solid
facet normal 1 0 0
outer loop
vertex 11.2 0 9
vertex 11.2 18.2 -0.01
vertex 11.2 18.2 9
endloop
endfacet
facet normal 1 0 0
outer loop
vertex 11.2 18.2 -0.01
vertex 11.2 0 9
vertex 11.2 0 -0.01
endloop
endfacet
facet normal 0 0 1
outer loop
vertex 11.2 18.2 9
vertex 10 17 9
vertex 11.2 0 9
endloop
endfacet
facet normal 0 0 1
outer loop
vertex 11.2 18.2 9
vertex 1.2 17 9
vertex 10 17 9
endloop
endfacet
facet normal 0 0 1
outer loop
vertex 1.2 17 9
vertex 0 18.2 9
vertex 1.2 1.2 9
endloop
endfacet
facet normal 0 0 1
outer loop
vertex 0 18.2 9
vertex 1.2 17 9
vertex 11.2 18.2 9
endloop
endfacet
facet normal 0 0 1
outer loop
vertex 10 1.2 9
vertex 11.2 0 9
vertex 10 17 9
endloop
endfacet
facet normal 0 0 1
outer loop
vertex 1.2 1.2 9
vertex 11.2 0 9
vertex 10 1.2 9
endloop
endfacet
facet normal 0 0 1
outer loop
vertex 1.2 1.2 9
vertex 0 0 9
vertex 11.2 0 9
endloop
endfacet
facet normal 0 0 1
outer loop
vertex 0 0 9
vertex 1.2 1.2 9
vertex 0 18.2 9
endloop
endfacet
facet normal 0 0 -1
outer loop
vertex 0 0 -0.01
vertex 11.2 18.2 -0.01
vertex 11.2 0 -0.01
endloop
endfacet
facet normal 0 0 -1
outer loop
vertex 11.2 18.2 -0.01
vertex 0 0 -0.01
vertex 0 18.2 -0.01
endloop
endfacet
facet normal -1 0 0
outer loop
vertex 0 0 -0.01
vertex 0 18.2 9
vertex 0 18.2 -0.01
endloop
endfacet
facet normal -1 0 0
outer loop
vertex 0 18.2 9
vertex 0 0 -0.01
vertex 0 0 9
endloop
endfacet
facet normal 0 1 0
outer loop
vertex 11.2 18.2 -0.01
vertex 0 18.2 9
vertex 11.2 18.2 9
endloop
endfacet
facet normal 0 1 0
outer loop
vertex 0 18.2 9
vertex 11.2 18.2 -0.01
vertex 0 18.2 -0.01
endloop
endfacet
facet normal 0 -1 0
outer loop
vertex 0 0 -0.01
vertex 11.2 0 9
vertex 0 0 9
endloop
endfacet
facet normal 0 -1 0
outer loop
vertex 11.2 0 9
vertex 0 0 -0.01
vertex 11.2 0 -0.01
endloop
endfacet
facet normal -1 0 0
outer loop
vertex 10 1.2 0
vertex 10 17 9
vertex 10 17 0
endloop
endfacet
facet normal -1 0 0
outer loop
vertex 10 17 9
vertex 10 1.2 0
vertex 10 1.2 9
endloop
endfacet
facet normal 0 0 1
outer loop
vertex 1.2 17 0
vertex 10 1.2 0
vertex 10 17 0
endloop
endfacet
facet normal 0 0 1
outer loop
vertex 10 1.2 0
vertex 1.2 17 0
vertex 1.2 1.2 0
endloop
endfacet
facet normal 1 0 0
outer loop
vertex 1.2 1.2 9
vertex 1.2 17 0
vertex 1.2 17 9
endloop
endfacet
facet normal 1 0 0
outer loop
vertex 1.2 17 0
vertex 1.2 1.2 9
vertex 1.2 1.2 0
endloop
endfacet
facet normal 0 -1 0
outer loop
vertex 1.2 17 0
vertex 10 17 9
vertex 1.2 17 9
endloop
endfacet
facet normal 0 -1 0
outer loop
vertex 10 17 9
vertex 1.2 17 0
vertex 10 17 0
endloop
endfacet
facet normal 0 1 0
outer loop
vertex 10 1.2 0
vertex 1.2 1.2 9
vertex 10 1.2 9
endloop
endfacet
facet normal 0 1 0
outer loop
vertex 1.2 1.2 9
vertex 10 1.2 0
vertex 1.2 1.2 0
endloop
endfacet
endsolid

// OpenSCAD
// file: ../Base/Rotation.scad
// Fischertechnik Box Foundation
// Geometry Helpers Rotation

include <PlacementOptions.scad>

// getRotatedSpace(space, rotation=NoRotation)
// Rotates the space dependent on the specified rotation

function getRotatedSpace(space, rotation=NoRotation) = [
    (rotation == Rotate90 || rotation == Rotate270) ? space.y : space.x,
    (rotation == Rotate90 || rotation == Rotate270) ? space.x : space.y
];

// Rotates the given space around the fixed left lower corner
// space = the space the children needs as width/depth list [width,depth]
// rotation = 0 Rotate0 degrees, 1 Rotate90 degrees, 2 Rotate180 degrees, 3 Rotate270 degrees (equivalent to -90)

module RotateFix(space, rotation=NoRotation) {
    dy = (rotation == Rotate0 || rotation == Rotate270) ? 0 :
        (rotation == Rotate90) ? space.x :
        space.y;
    dx = (rotation < Rotate180) ? 0 :
        (rotation == Rotate180) ? space.x :
        space.y;
    
    translate([dx, dy, 0])
        rotate([0, 0, rotations[rotation]])
            children();
}
// file: ../Base/Alignment.scad
// Fischertechnik Box Foundation
// Geometry Helpers Alignment

include <PlacementOptions.scad>

// getAlignedX(elementWidth, spaceWidth, align=AlignRight, offset=0)
// Gets the aligned X offset of an element with the given
// width in the given space.
// elementWidth = The width of the element to positon
// spaceWidth = The space where the element should be aligned
// align = 0 AlignLeft, 1 AlignCenter, 2 AlignRight
// offset = an optional offset from the aligned position. When
// aligned left or centered, then positive values are in X direction.
// When aligned right then positive values are in negative X direction.

function getAlignedX(elementWidth, spaceWidth, align=AlignRight, offset=0) =
    (align == AlignLeft) ?
        offset :
        ((align == AlignCenter) ?
        (spaceWidth - elementWidth)/2 + offset :
        spaceWidth - offset - elementWidth);

// getAlignedY(elementDepth, spaceDepth, align=AlignTop, offset=0)
// Gets the aligned Y offset of an element with the given
// depth in the given space.
// elementDepth = The depth of the element to positon
// spaceDepth = The space where the element should be aligned
// align = 0 AlignBottom, 1 AlignCenter, 2 AlignTop
// offset = an optional offset from the aligned position. When
// aligned bottom or centered, then positive values are in Y direction.
// When aligned top then positive values are in negative Y direction.

function getAlignedY(elementDepth, spaceDepth, align=AlignTop, offset=0) =
    (align == AlignBottom) ?
        offset :
        ((align == AlignCenter) ?
        (spaceDepth - elementDepth)/2 + offset :
        spaceDepth - offset - elementDepth);
// file: ../Base/PlacementOptions.scad
// Fischertechnik Box Foundation
// Placement Options

// Alignment
NoAlign = 0;
AlignLeft = 1;
AlignBottom = 2;
AlignCenter = 3;
AlignRight = 4;
AlignTop = 5;

// Element rotation degree steps
rotations = [0, -90, -180, -270];

// Rotation
NoRotation = 0;
Rotate0 = 0;
Rotate90 = 1;
Rotate180 = 2;
Rotate270 = 3;

// Docking (seen from above)
NoDock = -1;
DockLeft = 0;
DockTop = 1;
DockRight = 2;
DockCorner = 2;
DockBottom = 3;

// Web corners
LowerLeft = 0;
UpperLeft = 1;
UpperRight = 2;
LowerRight = 3;

// Web position relative to corner
LeftOfCorner = 0;
RightOfCorner = 1;

// Rails direction
Horizontal = true;
Vertical = false;
// file: ../Base/Boxes.scad
// Fischertechnik Box Foundation
// Pre-designed Boxes

use <Constants.scad>

include <PlacementOptions.scad>

box190Width = 190;
box190Depth = 130;
box130Width = 130;
box130Depth = 95;

// Values are from an original ec3 box
topBottomDifference = 1.5;
outerHeight = 40;
baseThickness = 1.8;
innerHeight = outerHeight - baseThickness;
stackExcess = 5.7;
radius = 3.5;
wallThickness = 1.5;
tolerance = 0.2;

boxWallThickness = wallThickness;
boxBaseThickness = baseThickness;
boxWebWidth = 3.0;

// getBoxWallThickness()
// Gets the wall thickness of a Fischertechnik Box
function getBoxWallThickness() = boxWallThickness;

// getBoxUsageHeight(height = 38.2)
// Gets the usable height of a Fischertechnik box
// height = Outer height of the box from the bottom to the upper edge.
function getBoxUsageHeight(height = outerHeight) = height - baseThickness - stackExcess;

// getBoxInnerHeight()
// Gets the inner height of a Fischertechnik box, including the stack excess
function getBoxInnerHeight() = innerHeight;

// getBoxBaseThickness()
// Gets the thickness of the Fischertechnik box base.
function getBoxBaseThickness() = boxBaseThickness;

// getBoxWebWidth()
// Gets the width of a box web
function getBoxWebWidth() = boxWebWidth;

// getBox190Space()
// Gets the usable inner space of a Box 190 as an x/y-list
function getBox190Space() = [
    box190Width - 2*getBoxWallThickness() - topBottomDifference, 
    box190Depth - 2*getBoxWallThickness() - topBottomDifference ];

// RoundedCornerPlate(width, depth, height, radius)
// Creates a body plate with rounded corners for a box. Used
// also to create the complete box with the hull module.
// width = Width of the plate
// depth = depth of the plate 
// height = thickness of the plate
// radius = radius of the rounded corner
module RoundedCornerPlate(width, depth, height, radius) {
    translate([radius, radius])
    hull() {
        w = width-2*radius;
        d = depth-2*radius;
        cube([w, d, height]);
        cylinder(height, r=radius, $fn=getFragments());
        translate([w, 0])
            cylinder(height, r=radius, $fn=getFragments());
        translate([w, d])
            cylinder(height, r=radius, $fn=getFragments());
        translate([0, d])
            cylinder(height, r=radius, $fn=getFragments());
    }
}

// BoxBase(width, depth)
// Creates an empty stackable Fischertechnik compatible box
// width = Outer width of the box (190, 130, ...)
// depth = Outer depth of the box (130, 95, ...)

module BoxBase(width, depth, height=outerHeight) {    
    thinPlate = 0.01;

    innerHeight = height - baseThickness;    
    
    module Body(tolerance=tolerance) {
        hull() {
            // Bottom with tolerance to fit into the original boxes when stacked
            translate([-wallThickness+tolerance, -wallThickness+tolerance, -baseThickness])
                RoundedCornerPlate(width-topBottomDifference-2*tolerance, depth-topBottomDifference-2*tolerance, thinPlate, radius);
            
            // Top
            translate([-wallThickness-topBottomDifference/2, -wallThickness-topBottomDifference/2, innerHeight-thinPlate])
                RoundedCornerPlate(width, depth, thinPlate, radius);
         }
    }

    module Cutoff() {
        hull() {
            coWidth = width - 2*wallThickness;
            coDepth = depth - 2*wallThickness;
            
            // Bottom
            RoundedCornerPlate(coWidth-topBottomDifference, coDepth-topBottomDifference, thinPlate, radius);

            // Top
            translate([-topBottomDifference/2, -topBottomDifference/2, innerHeight+thinPlate]) 
                RoundedCornerPlate(coWidth, coDepth, thinPlate, radius);
        }
    }
    
    difference() {        
        Body();
        Cutoff();
        stackOffset = innerHeight - stackExcess;
        translate([0, 0, stackOffset + baseThickness])
            Body(tolerance=0);
    }
}

// Creates the Fischertechnik empty box 130x190 mm and places it at position 0,0
// 190x130 are the outer sizes, the inner space is slightly smaller. Use getBox190Space() to get the inner sizes.
// The box is positioned that the usable inner space is at the 0,0,0 position.

module Box190() {
    BoxBase(box190Width, box190Depth);
}

// Gets the usable inner space of a Box 130 as an x/y-list
function getBox130Space() = [
    box130Width - 2*getBoxWallThickness() - topBottomDifference, 
    box130Depth - 2*getBoxWallThickness() - topBottomDifference ];

// Creates the Fischertechnik empty box 95x130 mm and places it at position 0,0
// 190x130 are the outer sizes, the inner space is slightly smaller. Use getBox190Space() to get the inner sizes.
// The box is positioned that the usable inner space is at the 0,0,0 position.

module Box130() {
    BoxBase(box130Width, box130Depth);
}

// Creates a web at the specified box walls
// corner 0 = LowerLeft, 1 = UpperLeft, 2 = UpperRight, 3 = LowerRight
// side 0 = LeftOfCorner, 1 = RightOfCorner
// distance = Distance in mm from the corner
// boxSpace = inner width and depth of the box (default: Box 190)
// webWidth = length of the web (default is 3 mms)
// webThickness = thickness of the web (default is 1 mm)
// height = Height of the web (standard is getBoxUsageHeight())
// sink = How much of the web is sunk into the wall

module BoxWeb(
    corner, 
    side, 
    distance, 
    boxSpace=getBox190Space(), 
    webWidth=getBoxWebWidth(), 
    webThickness=1.0, 
    height=getBoxUsageHeight(),
    sink = getBoxWallThickness()/2) {
    width = (corner % 2 == 0) ? 
            (side == LeftOfCorner ? webWidth : webThickness) :
            (side == LeftOfCorner ? webThickness : webWidth);

    depth = (corner % 2 == 0) ? 
            (side == RightOfCorner ? webWidth : webThickness) :
            (side == RightOfCorner ? webThickness : webWidth);
    
    xDiff = corner == LowerLeft ? 
                (side == LeftOfCorner ? -sink : distance) :
            (corner == UpperLeft ?                
                (side == LeftOfCorner ? distance : -sink) :
            (corner == UpperRight ?
                (side == LeftOfCorner ? boxSpace.x-webWidth+sink : boxSpace.x-distance-webThickness) :
                (side == LeftOfCorner ? boxSpace.x-distance-webThickness: boxSpace.x-webWidth+sink)));

    yDiff = corner == LowerLeft ? 
                (side == RightOfCorner ? -sink : distance) :
            (corner == UpperLeft ?
                (side == RightOfCorner ? boxSpace.y-distance-webThickness : boxSpace.y-webWidth+sink) :
            (corner == UpperRight ?
                (side == RightOfCorner ? boxSpace.y-webWidth+sink : boxSpace.y-distance-webThickness) :
                (side == RightOfCorner ? distance : -sink)));
    
    translate([xDiff, yDiff, -getExcess()])
        cube([width, depth, height + 2*getExcess()]);
}
// file: ../Base/Placement.scad
// Fischertechnik Box Foundation
// Geometry Helpers Placement

use <Constants.scad>
use <Alignment.scad>
use <Rotation.scad>
use <Boxes.scad>

include <PlacementOptions.scad>

// Place(x=0, y=0, elementSpace=[0,0], alignX=AlignLeft, alignY=AlignBottom, rotation=Rotate0, boxSpace=getBox190Space())
// Places the child at the specified position
// y = Y-Position. This is a relative position when an X aligment is specified.
// x = X-Position. This is a relative position when an Y aligment is specified.
// elementSpace = space of the element to be placed [x,y]
// alignX = -1=NoAlign, 0 AlignLeft, 1 AlignCenter, 3 AlignRight (elementSpace and boxSpace required!)
// alignY = -1=NoAlign, 2 AlignBottom, 1 AlignCenter, 4 AlignTop (elementSpace and boxSpace required!)
// rotation = 0 Rotate0 0 degrees, 1 Rotate90 90 degrees, 
// 2 Rotate180 180 degrees, 3 Rotate270 270 degrees (equivalent to -90)
// boxSpace = Inner space of the box where the placement occurs [x,y] - default is Box 190x130 inner space

module Place(x=0, y=0, elementSpace=[0,0], 
  alignX=AlignLeft, alignY=AlignBottom, 
  rotation=NoRotation, boxSpace=getBox190Space()) {

    module Position(x, y, space, rotation=Rotate0) {
        translate([x, y, 0])
            RotateFix(space, rotation)
                children();
    }

    space = getRotatedSpace(elementSpace, rotation);
    alignedX = getAlignedX(space.x, boxSpace.x, alignX, x);
    alignedY = getAlignedY(space.y, boxSpace.y, alignY, y);
    Position(alignedX, alignedY, elementSpace, rotation)
        children();
}

// Center(space=getBox130Space(), elementSpace=[0,0])
// space = Space where the children is centered. For cylinder use centered=true and no elementSpace.
// elementSpace = space of the element to be centered [x,y]

module Center(space=getBox190Space(), elementSpace=[0,0]) {
    Place(elementSpace=elementSpace, boxSpace=space, alignX=AlignCenter, alignY=AlignCenter)
        children();
}

// CenterHorizontal(width=0, y=0, offset=0, space=getBox130Space())
// width = Width of the element to be placed.
// y = Y position of the element
// offset = Offset from the center position (negative will be left of the center)
// space = Space where the element is placed

module CenterHorizontal(width=0, y=0, offset=0, space=getBox190Space()) {
    Place(x=offset, y=y, elementSpace=[width, 0], boxSpace=space, alignX=AlignCenter)
        children(0);
}

// CenterVertical(depth=0, x=0, offset=0, space=getBox130Space())
// depth = Depth of the element to be placed.
// x = X position of the element
// offset = Offset from the center position (negative will be down of the center)
// space = Space where the element is placed

module CenterVertical(depth=0, x=0, offset=0, space=getBox190Space()) {
    Place(x=x, y=offset, elementSpace=[0, depth], boxSpace=space, alignY=AlignCenter)
        children(0);
}

// getIsVertical(align)
// True if the specified alignment needs a vertical orientation for a divider (AlignRight, AlignLeft)

function getIsVertical(align) = (align == AlignRight || align == AlignLeft);

// getIsHorizontal(align)
// True if the specified alignment needs a horizontal orientation for a divider (AlignTop, AlignBottom)

function getIsHorizontal(align) = (align == AlignTop || align == AlignBottom);
// file: ../Base/Constants.scad
// Fischertechnik Box Foundation
// Constants

// Constant values necessary for multiple elements

// Base constants
dividerThickness = 1.2;
excess = 0.01;
fragments = 90;
tolerance = 0.8;

// Gets the thickness of a divider 
function getDividerThickness() = dividerThickness;

// Gets the excess that is used to merge walls into each other
function getExcess() = excess;

// Gets amount of fragments of a cylinder
function getFragments() = fragments;

// Gets the inner tolerance of a frame to each side
function getTolerance() = tolerance;


// Fischertechnik specific constants
axisDiameter = 4;
axisBottomDiameter = axisDiameter + 1;
axisTolerance = 0.2;
axisLockingLength = 8;

// Gets axis diameter of Fischertechnik axis
function getAxisDiameter() = axisDiameter;

// Gets axis diameter tolerance (subtracted for element axis)
function getAxisTolerance() = axisTolerance;

// Gets the axis diameter for standing axis
function getStandAxisDiameter() = getAxisDiameter() - getAxisTolerance();

// Gets axis bottom diameter for thicker part at the bottom
function getAxisBottomDiameter() = axisBottomDiameter;

// Gets the lengthh of the locking part of a locking axis
function getAxisLockingLength() = axisLockingLength;

pinHeight = 2.5;
pinTolerance = 0.2;

// gets the height of a connecting pin
function getPinHeight() = pinHeight;

// gets the connecting pin height tolerance
function getPinTolerance() = pinTolerance;

standardEdgeDistance = 2.5;
standardWebDistance = 11.5;
standardCornerLength = 15;

// gets the standard distance to the wall of the box for dockable frames with webs
function getStandardEdgeDistance() = standardEdgeDistance;

// gets the standard distance of each web to the corner of the dockable frame
function getStandardWebDistance() = standardWebDistance;

// gets the standard length of the corner walls of a dockable frame
function getStandardCornerLength() = standardCornerLength;

tubeWallFactor = 0.8;

// gets the wall thickness of a tube.
function getTubeWallThickness() = tubeWallFactor * getDividerThickness();

smallPartsFrameHeight = 20;

// gets the frame height for docked small parts boxes.
function getSmallPartsFrameHeight() = smallPartsFrameHeight;

hubRingDiameter = 19.5;
hubRingLevelDiameter = 21;

// gets the diameter of a tube matching the inner ring of a wheel
function getHubRingDiameter() = hubRingDiameter;

// gets the diameter of a hub tube with a thicker diameter
function getHubRingLevelDiameter() = hubRingLevelDiameter;
// main file
// Fischertechnik Box Library
// Frame for 15 degrees angle blocks
// 32071

use <../Base/Constants.scad>
use <../ModelBase/Simple.scad>

/* [Element Parameters] */
count = 1;

/* [Hidden] */
width = 8;
depth = 15;
height = 9;

// getFrameAngle15Space
// Gets the space the frame for 15 degrees angle blocks needs for count blocks
// count = Count of angle blocks

function getFrameAngle15Space(count=1) = getFrameOuterVolume([width * count, depth, height]);

// FrameAngle15(count)
// count = Count of angle blocks in x direction
// The walls of the frame are 9 mm high.

module FrameAngle15(count=1) {
    Frame([width * count, depth, height]);
}

// Tests
color ("lightgray")
FrameAngle15(count);
